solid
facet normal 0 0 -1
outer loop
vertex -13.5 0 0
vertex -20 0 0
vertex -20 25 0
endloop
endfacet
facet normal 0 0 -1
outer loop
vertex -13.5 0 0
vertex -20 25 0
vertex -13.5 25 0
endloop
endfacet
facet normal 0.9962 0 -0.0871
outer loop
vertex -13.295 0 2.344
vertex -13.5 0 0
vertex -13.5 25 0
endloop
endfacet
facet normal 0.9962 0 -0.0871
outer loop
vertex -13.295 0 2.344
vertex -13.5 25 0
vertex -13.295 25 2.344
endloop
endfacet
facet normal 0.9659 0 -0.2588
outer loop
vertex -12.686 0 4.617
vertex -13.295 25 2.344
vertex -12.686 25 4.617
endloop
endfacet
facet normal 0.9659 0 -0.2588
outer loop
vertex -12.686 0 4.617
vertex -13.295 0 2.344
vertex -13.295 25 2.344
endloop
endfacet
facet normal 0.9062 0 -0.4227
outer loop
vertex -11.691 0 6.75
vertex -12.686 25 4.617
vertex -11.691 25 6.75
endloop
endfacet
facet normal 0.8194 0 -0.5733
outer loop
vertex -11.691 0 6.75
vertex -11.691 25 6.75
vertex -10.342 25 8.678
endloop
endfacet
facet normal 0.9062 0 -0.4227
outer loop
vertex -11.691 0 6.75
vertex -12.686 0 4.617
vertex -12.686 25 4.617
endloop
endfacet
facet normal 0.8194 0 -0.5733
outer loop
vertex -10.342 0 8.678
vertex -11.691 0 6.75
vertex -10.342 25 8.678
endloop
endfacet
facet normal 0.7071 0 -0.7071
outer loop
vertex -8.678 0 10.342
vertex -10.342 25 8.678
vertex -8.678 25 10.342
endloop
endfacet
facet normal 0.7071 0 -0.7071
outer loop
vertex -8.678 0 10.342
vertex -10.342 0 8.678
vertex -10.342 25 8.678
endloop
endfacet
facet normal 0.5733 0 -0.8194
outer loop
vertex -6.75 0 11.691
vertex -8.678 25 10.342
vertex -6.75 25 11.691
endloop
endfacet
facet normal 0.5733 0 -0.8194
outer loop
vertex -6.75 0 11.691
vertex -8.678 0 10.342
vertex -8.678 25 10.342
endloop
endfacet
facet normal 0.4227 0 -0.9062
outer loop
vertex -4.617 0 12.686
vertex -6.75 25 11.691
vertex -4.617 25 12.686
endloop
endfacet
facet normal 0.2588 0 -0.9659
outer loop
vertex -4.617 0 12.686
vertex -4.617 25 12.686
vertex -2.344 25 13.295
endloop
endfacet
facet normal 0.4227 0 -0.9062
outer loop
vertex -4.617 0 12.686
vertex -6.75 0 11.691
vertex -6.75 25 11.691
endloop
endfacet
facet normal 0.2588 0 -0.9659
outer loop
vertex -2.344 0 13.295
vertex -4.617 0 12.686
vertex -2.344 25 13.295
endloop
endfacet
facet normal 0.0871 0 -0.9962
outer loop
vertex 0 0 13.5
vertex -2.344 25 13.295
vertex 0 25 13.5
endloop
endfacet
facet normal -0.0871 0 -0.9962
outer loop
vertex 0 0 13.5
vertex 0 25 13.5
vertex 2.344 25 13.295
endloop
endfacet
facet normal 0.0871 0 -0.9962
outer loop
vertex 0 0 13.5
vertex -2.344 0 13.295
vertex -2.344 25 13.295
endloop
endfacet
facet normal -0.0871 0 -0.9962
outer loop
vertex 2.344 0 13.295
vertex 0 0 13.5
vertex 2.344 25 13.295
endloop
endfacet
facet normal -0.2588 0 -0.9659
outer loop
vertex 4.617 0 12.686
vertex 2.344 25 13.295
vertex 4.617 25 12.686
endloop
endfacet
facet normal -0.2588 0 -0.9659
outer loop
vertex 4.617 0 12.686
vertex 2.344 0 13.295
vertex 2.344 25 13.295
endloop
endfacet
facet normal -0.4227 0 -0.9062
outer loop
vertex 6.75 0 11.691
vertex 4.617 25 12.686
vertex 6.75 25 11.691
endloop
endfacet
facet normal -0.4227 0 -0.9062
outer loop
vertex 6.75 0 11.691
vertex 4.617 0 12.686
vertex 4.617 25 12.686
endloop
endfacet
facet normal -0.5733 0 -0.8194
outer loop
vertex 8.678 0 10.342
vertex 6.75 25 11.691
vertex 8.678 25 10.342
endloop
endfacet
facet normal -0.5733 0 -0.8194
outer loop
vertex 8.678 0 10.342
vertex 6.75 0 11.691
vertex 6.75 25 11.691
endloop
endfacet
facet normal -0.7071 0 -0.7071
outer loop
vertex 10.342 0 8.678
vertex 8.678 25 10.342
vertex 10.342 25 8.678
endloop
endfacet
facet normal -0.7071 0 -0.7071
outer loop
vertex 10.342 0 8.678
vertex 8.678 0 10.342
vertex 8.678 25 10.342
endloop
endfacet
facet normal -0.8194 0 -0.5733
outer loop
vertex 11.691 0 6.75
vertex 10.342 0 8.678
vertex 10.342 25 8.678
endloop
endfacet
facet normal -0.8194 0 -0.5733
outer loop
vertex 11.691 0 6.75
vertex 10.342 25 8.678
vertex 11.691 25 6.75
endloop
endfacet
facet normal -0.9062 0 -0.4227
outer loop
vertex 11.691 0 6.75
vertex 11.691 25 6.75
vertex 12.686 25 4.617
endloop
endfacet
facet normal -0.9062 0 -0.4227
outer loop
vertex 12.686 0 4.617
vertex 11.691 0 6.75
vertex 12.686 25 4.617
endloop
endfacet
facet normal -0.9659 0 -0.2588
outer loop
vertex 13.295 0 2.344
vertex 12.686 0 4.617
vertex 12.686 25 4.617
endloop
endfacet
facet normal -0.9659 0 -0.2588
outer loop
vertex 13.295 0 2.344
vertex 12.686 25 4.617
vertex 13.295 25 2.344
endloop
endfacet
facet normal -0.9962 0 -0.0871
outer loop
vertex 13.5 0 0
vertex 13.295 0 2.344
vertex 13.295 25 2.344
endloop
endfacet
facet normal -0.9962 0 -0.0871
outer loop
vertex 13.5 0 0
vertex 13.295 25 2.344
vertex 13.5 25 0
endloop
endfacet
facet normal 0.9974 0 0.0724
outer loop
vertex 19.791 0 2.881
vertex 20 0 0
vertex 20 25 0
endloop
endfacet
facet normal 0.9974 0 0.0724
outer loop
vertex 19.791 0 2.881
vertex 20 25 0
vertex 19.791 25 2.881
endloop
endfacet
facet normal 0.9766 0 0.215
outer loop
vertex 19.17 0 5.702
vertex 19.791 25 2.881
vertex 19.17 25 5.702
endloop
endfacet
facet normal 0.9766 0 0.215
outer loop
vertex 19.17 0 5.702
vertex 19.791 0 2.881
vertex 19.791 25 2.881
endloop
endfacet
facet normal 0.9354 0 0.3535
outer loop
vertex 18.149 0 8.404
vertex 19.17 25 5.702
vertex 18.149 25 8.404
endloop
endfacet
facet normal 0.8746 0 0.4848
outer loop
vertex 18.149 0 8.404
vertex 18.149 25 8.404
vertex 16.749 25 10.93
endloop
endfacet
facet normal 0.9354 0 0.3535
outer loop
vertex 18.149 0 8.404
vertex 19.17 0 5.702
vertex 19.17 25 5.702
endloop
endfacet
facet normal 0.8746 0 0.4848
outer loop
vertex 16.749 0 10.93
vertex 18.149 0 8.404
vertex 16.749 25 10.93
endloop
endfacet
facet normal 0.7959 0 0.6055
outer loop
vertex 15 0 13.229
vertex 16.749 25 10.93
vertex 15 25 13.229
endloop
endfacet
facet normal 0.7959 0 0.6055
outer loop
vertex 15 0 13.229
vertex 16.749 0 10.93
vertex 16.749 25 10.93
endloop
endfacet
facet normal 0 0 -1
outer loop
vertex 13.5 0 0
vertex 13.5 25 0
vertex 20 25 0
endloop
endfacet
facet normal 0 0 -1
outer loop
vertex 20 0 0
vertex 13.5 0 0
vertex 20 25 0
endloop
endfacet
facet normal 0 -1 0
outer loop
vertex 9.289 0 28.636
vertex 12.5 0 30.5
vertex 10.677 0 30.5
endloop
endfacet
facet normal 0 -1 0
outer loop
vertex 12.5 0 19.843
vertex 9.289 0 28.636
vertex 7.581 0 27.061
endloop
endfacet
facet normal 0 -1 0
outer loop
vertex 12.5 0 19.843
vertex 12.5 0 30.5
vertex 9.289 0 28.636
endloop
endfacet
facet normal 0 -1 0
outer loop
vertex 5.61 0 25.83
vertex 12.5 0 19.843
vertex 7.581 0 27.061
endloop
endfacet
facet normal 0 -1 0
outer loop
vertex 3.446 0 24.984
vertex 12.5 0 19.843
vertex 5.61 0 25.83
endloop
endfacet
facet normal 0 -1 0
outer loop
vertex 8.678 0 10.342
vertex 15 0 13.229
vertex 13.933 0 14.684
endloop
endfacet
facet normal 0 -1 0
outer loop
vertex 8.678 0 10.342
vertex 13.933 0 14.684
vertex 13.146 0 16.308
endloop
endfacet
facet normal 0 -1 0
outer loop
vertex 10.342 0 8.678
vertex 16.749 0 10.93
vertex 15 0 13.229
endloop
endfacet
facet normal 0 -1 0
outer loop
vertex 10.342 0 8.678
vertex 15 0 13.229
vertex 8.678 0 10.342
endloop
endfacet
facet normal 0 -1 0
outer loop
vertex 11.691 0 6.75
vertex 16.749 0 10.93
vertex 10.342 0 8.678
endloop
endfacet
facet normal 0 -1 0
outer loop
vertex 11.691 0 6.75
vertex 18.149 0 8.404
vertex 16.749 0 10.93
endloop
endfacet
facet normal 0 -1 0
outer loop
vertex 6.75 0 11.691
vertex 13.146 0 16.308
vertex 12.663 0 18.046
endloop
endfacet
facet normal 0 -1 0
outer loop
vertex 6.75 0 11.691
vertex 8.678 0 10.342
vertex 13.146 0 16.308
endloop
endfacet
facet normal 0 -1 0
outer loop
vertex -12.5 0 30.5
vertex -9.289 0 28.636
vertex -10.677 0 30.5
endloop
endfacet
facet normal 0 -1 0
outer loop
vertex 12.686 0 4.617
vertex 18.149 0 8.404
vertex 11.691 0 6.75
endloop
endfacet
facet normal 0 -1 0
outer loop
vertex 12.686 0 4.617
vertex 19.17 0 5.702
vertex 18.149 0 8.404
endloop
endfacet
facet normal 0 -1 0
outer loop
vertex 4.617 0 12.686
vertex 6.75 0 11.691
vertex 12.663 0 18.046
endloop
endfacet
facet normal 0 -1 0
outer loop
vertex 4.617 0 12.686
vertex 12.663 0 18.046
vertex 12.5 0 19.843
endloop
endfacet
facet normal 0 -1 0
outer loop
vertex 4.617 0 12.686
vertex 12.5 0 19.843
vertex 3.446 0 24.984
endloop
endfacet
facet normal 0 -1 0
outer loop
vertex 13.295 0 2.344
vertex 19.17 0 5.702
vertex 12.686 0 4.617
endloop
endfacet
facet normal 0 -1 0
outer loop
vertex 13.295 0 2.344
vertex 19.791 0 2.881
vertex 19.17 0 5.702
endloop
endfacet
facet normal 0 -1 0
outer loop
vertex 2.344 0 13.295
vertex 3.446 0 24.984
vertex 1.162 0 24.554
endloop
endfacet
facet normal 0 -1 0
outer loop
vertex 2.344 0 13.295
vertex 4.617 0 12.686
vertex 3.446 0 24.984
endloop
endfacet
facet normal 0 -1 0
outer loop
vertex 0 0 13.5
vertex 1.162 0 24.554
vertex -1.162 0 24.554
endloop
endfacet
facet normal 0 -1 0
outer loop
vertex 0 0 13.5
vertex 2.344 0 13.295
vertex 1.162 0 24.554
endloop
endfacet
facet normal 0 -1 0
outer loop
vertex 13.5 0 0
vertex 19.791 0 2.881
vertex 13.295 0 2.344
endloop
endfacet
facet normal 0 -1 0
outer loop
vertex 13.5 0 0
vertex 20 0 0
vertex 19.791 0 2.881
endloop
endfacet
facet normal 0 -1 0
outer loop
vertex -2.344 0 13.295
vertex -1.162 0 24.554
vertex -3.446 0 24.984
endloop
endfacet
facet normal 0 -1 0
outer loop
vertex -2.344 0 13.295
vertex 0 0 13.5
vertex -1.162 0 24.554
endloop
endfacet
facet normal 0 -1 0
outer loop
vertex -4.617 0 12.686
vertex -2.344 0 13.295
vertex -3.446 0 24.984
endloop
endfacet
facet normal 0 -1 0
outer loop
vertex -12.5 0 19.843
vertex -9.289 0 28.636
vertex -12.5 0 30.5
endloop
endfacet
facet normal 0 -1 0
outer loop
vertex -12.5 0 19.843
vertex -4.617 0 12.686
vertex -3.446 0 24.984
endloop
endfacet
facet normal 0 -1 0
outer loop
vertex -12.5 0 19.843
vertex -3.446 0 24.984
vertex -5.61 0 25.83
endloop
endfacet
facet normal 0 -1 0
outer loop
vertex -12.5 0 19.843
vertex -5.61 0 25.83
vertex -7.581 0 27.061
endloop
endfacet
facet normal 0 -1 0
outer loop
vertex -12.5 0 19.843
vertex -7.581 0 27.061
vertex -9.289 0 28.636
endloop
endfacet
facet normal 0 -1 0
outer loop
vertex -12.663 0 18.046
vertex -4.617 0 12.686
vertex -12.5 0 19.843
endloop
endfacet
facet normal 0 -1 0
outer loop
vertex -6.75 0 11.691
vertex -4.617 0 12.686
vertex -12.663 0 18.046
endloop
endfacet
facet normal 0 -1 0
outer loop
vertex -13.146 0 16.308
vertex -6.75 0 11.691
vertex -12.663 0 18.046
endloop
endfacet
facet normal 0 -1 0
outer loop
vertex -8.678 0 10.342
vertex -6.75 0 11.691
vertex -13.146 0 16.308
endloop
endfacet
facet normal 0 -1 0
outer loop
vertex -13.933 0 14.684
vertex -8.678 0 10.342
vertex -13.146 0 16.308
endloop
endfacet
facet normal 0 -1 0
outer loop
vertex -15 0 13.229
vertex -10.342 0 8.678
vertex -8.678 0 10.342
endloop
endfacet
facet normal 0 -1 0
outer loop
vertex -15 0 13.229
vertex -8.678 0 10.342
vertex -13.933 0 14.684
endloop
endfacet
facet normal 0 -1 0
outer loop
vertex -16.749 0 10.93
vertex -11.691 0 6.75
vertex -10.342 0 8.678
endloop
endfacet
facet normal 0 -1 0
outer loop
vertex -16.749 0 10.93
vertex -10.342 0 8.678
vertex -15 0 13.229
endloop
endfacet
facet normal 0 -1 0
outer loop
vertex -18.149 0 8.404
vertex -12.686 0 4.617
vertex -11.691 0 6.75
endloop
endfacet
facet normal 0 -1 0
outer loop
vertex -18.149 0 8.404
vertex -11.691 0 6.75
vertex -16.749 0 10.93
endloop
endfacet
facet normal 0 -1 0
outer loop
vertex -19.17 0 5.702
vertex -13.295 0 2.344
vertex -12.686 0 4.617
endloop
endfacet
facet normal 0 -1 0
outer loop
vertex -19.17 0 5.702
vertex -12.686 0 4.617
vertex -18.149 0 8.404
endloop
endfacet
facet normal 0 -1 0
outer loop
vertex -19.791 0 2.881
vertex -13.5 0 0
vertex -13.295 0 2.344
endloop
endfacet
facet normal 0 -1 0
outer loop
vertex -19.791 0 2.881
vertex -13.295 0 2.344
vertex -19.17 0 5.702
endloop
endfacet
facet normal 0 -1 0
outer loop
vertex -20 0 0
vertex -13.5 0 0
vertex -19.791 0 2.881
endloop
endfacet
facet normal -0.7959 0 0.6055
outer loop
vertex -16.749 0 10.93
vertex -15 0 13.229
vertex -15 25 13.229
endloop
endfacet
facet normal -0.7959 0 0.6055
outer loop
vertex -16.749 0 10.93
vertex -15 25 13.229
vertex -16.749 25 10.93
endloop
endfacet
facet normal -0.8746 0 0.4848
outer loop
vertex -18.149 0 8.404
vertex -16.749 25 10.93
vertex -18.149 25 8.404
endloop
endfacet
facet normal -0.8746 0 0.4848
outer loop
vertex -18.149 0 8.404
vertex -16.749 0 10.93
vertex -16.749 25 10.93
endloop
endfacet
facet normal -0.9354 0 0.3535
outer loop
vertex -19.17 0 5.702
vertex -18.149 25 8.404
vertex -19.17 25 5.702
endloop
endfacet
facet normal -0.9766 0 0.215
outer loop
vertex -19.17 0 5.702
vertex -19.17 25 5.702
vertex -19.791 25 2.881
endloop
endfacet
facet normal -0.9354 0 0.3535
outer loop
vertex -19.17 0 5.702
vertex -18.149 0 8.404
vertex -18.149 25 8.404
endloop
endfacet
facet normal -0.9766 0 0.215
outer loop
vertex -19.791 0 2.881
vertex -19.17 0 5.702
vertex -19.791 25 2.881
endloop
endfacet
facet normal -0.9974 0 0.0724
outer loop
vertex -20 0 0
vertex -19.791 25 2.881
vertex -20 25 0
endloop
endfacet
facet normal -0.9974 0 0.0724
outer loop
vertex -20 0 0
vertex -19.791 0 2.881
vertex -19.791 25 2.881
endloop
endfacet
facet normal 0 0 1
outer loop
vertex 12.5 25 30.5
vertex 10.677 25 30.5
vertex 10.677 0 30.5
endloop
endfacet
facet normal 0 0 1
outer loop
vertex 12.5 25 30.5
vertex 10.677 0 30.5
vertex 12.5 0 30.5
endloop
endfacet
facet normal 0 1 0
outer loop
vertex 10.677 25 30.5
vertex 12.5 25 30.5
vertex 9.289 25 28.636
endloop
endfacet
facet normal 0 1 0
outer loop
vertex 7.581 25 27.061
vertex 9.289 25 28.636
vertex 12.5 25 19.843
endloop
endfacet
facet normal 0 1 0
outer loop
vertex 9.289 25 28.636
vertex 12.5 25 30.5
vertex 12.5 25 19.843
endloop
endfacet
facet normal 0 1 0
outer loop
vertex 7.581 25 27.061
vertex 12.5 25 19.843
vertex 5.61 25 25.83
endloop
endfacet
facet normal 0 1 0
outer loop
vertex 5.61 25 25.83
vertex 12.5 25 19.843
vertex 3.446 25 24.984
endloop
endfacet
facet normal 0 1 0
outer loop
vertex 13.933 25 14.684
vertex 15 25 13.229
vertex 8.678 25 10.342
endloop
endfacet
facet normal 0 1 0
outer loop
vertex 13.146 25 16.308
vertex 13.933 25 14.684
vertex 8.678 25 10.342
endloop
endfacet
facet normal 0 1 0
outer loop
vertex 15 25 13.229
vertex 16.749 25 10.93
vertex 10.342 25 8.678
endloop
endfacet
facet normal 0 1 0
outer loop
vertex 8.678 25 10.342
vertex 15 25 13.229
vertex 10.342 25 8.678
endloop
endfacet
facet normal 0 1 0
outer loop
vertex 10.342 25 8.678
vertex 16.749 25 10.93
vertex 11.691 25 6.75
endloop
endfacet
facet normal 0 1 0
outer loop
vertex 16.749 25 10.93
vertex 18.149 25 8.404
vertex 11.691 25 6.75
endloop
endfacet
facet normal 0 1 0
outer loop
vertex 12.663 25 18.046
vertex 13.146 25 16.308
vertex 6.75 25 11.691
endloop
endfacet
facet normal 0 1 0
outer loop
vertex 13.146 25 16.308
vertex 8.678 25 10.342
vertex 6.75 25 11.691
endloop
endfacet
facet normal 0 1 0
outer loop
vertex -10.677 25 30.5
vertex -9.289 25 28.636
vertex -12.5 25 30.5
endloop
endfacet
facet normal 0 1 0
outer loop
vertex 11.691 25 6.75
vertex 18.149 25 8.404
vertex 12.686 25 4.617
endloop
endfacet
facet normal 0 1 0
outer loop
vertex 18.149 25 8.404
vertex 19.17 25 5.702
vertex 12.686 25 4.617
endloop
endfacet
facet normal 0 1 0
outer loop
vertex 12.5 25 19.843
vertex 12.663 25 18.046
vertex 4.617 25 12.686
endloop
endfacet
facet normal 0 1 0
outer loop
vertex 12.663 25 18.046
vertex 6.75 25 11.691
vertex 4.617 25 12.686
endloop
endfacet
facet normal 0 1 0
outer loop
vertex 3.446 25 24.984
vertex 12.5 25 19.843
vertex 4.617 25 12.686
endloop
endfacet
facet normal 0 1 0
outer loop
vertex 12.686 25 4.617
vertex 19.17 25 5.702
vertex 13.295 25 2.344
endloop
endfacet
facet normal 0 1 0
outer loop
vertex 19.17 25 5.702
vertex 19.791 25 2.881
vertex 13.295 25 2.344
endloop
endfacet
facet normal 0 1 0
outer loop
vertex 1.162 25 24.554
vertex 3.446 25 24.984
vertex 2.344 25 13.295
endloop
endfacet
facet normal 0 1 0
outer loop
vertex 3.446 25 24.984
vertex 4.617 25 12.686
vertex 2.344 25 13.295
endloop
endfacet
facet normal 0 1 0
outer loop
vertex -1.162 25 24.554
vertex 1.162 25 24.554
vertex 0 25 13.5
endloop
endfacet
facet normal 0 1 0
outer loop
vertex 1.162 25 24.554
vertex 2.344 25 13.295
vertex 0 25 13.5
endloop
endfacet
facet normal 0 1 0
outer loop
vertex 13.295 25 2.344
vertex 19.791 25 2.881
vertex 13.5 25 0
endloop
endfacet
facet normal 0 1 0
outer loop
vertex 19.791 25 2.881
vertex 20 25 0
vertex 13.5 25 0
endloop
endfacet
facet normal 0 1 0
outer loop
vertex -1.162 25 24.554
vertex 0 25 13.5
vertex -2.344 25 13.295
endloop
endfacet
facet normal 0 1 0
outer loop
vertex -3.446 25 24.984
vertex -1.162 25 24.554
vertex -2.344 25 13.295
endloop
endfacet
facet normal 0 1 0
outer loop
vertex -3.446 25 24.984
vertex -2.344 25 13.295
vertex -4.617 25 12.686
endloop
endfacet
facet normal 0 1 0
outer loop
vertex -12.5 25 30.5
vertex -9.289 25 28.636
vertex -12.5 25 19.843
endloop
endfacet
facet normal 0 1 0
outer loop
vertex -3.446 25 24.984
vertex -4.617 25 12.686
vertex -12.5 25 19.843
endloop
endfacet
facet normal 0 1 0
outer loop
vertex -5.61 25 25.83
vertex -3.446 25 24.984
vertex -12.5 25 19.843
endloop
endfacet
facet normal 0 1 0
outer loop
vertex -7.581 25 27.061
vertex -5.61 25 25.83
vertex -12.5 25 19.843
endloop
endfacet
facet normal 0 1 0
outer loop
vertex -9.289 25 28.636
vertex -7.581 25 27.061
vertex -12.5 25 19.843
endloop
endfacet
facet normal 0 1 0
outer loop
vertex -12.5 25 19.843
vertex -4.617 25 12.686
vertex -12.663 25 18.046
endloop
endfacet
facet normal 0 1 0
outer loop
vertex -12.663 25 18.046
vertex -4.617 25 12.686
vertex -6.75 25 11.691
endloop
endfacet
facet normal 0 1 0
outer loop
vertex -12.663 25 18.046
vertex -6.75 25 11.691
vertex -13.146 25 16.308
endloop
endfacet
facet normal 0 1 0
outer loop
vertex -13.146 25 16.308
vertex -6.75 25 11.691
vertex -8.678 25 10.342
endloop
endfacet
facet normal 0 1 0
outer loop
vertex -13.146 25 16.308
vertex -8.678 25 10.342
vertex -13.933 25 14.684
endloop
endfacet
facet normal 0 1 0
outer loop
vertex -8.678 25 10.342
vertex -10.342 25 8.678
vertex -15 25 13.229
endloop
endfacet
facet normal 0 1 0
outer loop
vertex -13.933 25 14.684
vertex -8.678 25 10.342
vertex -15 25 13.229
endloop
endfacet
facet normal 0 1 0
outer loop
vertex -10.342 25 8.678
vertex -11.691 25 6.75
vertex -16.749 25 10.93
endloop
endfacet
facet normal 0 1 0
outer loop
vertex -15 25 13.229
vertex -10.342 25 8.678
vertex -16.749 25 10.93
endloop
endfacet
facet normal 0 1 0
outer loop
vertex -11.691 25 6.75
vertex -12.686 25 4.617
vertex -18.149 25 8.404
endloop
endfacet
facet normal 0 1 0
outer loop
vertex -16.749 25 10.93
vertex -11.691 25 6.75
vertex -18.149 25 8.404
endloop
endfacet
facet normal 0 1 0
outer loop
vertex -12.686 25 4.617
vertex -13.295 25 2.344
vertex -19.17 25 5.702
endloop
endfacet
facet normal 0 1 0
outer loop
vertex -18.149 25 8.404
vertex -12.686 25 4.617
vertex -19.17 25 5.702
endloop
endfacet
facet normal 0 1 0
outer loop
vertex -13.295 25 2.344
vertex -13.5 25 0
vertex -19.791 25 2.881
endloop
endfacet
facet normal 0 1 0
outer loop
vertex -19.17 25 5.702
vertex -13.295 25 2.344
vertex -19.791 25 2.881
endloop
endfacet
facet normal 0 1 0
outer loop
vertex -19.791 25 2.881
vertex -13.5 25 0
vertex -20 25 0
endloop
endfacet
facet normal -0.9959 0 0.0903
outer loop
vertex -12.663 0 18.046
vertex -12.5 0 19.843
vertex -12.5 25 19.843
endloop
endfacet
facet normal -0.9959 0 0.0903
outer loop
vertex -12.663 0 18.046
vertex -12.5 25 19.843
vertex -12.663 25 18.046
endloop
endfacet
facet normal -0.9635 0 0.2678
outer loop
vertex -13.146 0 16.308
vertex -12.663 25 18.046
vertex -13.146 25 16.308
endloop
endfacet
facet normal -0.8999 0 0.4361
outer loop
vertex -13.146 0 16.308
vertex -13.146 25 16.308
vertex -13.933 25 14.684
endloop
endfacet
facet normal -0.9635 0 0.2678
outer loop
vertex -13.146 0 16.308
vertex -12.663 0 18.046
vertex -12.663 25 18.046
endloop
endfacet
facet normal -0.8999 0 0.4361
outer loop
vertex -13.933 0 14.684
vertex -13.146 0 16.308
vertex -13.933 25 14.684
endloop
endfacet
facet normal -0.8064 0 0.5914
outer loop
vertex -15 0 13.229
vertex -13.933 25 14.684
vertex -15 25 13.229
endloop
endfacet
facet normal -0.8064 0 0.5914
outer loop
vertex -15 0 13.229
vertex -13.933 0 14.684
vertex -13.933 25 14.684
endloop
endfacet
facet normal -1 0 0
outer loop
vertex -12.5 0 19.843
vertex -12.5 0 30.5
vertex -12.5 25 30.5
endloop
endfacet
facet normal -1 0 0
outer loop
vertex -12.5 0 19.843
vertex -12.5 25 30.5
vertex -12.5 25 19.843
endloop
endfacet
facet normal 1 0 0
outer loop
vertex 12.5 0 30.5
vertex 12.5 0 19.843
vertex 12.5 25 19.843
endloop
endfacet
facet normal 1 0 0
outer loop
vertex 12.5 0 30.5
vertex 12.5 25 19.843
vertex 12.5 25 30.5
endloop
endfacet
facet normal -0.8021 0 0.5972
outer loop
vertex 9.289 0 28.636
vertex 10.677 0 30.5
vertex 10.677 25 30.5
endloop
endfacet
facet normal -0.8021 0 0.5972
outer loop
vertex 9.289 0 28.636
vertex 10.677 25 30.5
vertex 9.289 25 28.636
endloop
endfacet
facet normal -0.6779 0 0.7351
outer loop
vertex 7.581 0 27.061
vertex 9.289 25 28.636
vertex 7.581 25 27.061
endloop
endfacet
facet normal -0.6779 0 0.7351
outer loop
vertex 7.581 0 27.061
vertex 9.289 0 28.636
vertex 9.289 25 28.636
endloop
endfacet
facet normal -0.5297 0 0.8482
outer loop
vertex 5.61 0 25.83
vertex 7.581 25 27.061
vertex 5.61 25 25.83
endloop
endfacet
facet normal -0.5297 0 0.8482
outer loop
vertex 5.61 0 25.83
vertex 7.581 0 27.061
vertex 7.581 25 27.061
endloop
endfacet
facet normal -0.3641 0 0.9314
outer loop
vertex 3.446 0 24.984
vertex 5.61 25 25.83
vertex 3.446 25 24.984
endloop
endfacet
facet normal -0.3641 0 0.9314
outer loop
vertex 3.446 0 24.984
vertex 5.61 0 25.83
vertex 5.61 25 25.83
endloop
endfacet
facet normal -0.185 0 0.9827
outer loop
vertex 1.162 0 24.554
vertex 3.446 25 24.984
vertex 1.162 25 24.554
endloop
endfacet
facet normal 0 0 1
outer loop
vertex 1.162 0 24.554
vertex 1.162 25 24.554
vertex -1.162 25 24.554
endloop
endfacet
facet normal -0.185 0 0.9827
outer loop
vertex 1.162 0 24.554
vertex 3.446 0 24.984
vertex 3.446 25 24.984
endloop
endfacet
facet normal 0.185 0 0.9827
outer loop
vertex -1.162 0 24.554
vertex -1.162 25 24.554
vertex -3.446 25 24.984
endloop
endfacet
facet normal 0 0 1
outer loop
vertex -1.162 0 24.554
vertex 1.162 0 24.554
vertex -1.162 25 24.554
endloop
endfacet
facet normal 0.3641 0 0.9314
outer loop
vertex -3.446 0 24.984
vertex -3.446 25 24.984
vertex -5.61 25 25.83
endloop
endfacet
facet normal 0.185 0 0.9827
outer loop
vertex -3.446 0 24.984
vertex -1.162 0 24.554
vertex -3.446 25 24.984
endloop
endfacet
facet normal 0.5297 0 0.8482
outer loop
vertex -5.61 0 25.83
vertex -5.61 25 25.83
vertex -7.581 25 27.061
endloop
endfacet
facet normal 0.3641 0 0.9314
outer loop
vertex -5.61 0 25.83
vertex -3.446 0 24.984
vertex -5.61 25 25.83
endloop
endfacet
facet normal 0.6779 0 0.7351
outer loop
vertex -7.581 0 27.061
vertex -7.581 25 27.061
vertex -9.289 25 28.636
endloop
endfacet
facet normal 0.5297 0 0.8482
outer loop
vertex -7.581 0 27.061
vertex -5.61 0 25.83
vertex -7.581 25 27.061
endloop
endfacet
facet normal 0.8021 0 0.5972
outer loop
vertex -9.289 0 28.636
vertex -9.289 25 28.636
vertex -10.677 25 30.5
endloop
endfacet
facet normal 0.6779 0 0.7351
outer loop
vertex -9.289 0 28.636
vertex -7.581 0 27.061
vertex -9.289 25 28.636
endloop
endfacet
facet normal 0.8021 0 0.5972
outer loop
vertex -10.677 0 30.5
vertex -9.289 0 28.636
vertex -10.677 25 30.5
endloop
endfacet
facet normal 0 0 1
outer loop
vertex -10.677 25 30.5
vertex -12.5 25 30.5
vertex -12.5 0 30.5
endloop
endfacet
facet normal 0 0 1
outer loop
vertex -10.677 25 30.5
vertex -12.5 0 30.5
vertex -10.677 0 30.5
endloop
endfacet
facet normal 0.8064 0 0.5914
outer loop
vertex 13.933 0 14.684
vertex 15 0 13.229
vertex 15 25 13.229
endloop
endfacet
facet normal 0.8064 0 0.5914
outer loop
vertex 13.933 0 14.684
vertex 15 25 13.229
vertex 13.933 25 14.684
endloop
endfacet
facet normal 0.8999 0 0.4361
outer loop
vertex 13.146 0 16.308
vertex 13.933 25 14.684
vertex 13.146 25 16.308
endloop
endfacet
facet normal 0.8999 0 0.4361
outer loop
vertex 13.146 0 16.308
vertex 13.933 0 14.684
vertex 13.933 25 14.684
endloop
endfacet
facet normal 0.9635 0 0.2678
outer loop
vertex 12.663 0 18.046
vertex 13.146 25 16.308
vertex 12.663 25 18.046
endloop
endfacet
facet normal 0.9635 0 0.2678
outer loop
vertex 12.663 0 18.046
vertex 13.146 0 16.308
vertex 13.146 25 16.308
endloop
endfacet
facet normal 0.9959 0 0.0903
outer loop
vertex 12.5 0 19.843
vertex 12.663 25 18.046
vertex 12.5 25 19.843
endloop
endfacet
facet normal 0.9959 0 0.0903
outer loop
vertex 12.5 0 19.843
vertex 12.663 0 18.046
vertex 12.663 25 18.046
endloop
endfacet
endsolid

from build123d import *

# Parameters (mm, degrees)
EXTRUDE_1_DEPTH     = 25
SKETCH_2_W          = 28.626473145
SKETCH_2_H          = 10
CUT_EXTRUDE_1_DEPTH = 49.928519291


with BuildPart() as part:
    # Эскиз1 → Бобышка-Вытянуть1 (new body)
    with BuildSketch(Plane(origin=(0, 0, 0), x_dir=(1, 0, 0), z_dir=(0, 1, 0))):
        with BuildLine():
            Line((-12.5, -37), (-12.5, -19.843134833))
            ThreePointArc((-12.5, -19.843134833), (-13.145856533, -16.307600927), (-15, -13.228756555))
            ThreePointArc((-15, -13.228756555), (-18.708286934, -7.071067812), (-20, 0))
            Line((-20, 0), (-13.5, 0))
            ThreePointArc((-13.5, 0), (0, -13.5), (13.5, 0))
            Line((13.5, 0), (20, 0))
            ThreePointArc((20, 0), (18.708286934, -7.071067812), (15, -13.228756555))
            ThreePointArc((15, -13.228756555), (13.145856533, -16.307600927), (12.5, -19.843134833))
            Line((12.5, -19.843134833), (12.5, -37))
            ThreePointArc((12.5, -37), (0, -24.5), (-12.5, -37))
        make_face()
    extrude(amount=EXTRUDE_1_DEPTH)

    # Эскиз2 → Вырез-Вытянуть1 (cut, through all)
    with BuildSketch(Plane(origin=(0, 25, 0), x_dir=(1, 0, 0), z_dir=(0, 1, 0))):
        with Locations((0.56499618, -35.5)):
            Rectangle(SKETCH_2_W, SKETCH_2_H)
    extrude(amount=-CUT_EXTRUDE_1_DEPTH, mode=Mode.SUBTRACT)


solid = part.part
